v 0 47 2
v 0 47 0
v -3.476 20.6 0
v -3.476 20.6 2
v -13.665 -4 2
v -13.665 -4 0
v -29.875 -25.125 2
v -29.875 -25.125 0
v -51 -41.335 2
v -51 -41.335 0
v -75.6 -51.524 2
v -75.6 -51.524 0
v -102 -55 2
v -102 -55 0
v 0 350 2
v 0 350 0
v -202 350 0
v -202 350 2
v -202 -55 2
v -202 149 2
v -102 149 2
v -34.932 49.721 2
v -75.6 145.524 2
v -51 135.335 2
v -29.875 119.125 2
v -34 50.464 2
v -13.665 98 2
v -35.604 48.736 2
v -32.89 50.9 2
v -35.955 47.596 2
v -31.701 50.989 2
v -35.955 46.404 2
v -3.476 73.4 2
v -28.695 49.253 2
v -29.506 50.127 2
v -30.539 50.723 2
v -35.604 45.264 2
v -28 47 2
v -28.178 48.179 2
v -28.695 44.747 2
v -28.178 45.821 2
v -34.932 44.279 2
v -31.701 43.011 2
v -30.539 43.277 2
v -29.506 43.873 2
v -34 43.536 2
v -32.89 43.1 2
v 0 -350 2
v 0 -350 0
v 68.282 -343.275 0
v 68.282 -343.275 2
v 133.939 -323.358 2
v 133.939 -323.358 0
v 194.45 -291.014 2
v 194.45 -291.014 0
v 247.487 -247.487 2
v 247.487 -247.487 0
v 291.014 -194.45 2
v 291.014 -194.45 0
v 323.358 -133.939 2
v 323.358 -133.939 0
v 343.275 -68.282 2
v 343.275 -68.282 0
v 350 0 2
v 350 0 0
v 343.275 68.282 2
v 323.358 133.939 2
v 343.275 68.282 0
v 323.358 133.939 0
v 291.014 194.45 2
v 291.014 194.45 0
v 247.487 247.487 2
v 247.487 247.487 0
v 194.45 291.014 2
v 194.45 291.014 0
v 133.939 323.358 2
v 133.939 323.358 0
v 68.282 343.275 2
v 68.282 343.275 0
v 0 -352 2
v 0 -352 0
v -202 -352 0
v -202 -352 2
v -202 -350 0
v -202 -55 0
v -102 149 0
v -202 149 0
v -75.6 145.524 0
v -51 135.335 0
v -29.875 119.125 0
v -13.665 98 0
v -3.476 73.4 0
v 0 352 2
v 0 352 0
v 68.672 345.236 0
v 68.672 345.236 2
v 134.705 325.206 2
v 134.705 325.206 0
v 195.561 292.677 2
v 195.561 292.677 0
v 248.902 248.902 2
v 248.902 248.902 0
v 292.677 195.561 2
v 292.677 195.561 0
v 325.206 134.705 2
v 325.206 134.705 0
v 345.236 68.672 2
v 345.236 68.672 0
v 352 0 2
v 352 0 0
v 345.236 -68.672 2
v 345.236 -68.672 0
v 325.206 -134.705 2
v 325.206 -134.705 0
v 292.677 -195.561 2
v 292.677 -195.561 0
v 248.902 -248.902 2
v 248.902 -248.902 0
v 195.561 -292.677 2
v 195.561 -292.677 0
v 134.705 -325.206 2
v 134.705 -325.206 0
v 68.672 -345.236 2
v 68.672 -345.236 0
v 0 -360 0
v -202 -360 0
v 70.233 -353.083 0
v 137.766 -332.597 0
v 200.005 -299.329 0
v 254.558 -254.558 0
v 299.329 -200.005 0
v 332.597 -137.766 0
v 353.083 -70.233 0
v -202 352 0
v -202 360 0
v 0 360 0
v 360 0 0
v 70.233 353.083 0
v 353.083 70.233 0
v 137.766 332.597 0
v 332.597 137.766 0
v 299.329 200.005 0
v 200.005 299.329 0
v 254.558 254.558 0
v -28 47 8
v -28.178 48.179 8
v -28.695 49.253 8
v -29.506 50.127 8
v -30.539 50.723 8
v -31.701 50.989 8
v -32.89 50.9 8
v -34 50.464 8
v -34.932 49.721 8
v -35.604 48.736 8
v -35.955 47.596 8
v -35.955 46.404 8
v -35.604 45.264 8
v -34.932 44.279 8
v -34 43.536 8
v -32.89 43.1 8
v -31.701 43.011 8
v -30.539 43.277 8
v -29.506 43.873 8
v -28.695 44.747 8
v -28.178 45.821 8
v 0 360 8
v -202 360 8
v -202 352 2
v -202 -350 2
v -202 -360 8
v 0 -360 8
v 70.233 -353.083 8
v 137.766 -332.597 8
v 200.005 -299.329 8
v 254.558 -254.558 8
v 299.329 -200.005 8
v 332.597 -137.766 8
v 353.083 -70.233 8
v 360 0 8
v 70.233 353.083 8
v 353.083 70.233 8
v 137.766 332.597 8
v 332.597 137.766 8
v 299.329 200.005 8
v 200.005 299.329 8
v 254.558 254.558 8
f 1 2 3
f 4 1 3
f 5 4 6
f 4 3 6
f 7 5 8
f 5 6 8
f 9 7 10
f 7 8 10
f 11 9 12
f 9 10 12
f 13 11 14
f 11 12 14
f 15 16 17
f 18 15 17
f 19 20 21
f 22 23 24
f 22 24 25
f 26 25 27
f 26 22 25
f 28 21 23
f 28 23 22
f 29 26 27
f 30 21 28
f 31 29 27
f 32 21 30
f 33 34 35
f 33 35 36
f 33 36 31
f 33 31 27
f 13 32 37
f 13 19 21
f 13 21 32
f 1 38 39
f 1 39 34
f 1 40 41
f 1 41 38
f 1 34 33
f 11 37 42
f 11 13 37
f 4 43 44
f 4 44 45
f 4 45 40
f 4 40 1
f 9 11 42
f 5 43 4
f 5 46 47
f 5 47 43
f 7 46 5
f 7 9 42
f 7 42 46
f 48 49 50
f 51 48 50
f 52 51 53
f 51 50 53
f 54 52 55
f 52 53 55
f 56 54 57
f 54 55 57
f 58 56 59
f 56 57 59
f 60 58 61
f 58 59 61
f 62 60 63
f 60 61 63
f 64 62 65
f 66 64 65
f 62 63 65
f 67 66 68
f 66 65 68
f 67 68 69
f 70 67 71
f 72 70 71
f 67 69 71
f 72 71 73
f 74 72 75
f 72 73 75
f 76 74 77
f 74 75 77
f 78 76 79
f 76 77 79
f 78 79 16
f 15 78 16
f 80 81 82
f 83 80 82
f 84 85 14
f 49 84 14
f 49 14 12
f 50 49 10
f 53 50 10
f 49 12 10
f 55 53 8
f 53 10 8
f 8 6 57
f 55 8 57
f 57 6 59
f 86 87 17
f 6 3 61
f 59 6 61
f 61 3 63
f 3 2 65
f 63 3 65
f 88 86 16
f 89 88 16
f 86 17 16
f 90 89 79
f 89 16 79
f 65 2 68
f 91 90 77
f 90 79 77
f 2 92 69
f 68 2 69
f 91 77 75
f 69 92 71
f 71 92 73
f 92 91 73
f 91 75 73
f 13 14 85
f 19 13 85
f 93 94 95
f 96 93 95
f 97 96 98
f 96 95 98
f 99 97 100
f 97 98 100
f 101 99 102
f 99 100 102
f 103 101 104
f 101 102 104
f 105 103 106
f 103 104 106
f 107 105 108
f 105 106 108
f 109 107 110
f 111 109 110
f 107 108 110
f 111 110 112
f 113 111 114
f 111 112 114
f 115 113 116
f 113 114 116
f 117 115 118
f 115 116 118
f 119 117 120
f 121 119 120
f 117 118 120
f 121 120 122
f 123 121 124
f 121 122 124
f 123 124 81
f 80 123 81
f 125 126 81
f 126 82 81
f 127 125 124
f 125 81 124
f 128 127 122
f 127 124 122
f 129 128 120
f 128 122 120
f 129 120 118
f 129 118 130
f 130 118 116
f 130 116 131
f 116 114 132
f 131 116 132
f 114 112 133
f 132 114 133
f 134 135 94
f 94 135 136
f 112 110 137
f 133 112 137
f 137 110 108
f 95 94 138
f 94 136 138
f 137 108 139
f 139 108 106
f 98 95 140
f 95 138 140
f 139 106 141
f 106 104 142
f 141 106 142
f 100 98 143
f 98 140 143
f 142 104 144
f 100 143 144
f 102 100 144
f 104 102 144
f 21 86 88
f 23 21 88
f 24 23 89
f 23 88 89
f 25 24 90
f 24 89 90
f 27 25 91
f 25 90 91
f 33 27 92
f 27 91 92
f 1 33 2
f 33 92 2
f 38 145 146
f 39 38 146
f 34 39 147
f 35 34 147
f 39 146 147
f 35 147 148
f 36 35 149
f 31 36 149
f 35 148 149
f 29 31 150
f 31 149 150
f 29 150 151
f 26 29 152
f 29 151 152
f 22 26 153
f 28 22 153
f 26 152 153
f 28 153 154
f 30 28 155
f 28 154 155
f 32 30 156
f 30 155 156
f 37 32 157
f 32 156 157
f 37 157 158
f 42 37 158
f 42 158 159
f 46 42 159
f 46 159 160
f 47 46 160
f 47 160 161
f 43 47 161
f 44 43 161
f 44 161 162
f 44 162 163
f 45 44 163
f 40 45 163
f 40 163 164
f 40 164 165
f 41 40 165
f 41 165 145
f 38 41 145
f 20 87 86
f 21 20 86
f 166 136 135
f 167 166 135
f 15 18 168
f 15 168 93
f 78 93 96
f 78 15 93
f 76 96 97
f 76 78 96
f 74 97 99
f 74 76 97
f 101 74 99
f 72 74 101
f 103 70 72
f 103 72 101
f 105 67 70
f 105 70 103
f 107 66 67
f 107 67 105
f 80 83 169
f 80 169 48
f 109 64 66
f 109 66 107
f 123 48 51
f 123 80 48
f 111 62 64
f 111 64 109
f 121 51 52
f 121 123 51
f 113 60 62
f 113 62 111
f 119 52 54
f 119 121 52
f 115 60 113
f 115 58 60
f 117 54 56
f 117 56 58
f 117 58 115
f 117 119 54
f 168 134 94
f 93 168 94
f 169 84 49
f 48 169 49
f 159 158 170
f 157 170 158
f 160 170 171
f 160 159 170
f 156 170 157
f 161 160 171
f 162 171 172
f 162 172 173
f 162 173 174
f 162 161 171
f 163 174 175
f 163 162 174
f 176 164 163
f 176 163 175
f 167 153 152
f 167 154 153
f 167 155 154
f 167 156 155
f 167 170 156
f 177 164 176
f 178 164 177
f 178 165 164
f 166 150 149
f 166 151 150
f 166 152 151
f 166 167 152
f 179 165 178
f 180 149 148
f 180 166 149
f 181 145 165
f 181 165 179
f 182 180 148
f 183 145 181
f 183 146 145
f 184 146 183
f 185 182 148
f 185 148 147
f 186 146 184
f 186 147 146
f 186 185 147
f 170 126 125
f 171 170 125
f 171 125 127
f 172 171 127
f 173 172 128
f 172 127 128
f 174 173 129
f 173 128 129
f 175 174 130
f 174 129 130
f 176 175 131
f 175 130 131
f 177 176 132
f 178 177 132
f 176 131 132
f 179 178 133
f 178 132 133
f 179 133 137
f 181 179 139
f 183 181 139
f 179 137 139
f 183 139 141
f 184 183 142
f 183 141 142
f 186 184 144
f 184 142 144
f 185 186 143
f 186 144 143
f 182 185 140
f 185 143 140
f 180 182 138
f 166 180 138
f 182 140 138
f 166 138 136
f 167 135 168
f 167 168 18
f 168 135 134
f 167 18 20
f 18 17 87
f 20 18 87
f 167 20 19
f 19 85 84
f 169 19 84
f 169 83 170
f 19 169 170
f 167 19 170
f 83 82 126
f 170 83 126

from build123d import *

# Parameters (mm, degrees)
F1_DEPTH = 8
F3_DEPTH = 2
F4_R     = 4
F5_DEPTH = 8
F7_DEPTH = 2


with BuildPart() as f1:
    # F0 (on Top) → F1 (new body)
    with BuildSketch(Plane.XY):
        with BuildLine():
            Line((-102, -360), (0, -360))
            ThreePointArc((0, -360), (360, 0), (0, 360))
            Line((0, 360), (-102, 360))
            Line((-102, 360), (-202, 360))
            Line((-202, 360), (-202, -360))
            Line((-202, -360), (-102, -360))
        make_face()
    extrude(amount=F1_DEPTH)

    # F2 (on face) → F3 (cut)
    with BuildSketch(Plane(origin=(0, 0, 0), x_dir=(1, 0, 0), z_dir=(0, 0, -1))):
        with BuildLine():
            ThreePointArc((0, 350), (350, 0), (0, -350))
            Line((0, -350), (-202, -350))
            Line((-202, -350), (-202, -352))
            Line((-202, -352), (0, -352))
            ThreePointArc((0, -352), (352, 0), (0, 352))
            Line((0, 352), (-202, 352))
            Line((-202, 352), (-202, 350))
            Line((-202, 350), (0, 350))
        make_face()
    extrude(amount=-F3_DEPTH, mode=Mode.SUBTRACT)

    # F4 (on face) → F5 (cut, through all)
    with BuildSketch(Plane.XY.offset(8)):
        with Locations((-32, 47)):
            Circle(F4_R)
    extrude(amount=-F5_DEPTH, mode=Mode.SUBTRACT)

    # F6 (on face) → F7 (cut)
    with BuildSketch(Plane(origin=(0, 0, 0), x_dir=(1, 0, 0), z_dir=(0, 0, -1))):
        with BuildLine():
            Line((-202, -149), (-102, -149))
            ThreePointArc((-102, -149), (-29.875108278, -119.1248916401), (0, -46.9999998841))
            ThreePointArc((0, -46.9999998841), (-29.8751083599, 25.124891722), (-102, 55))
            Line((-102, 55), (-202, 55))
            Line((-202, 55), (-202, -149))
        make_face()
    extrude(amount=-F7_DEPTH, mode=Mode.SUBTRACT)


solid = f1.part
